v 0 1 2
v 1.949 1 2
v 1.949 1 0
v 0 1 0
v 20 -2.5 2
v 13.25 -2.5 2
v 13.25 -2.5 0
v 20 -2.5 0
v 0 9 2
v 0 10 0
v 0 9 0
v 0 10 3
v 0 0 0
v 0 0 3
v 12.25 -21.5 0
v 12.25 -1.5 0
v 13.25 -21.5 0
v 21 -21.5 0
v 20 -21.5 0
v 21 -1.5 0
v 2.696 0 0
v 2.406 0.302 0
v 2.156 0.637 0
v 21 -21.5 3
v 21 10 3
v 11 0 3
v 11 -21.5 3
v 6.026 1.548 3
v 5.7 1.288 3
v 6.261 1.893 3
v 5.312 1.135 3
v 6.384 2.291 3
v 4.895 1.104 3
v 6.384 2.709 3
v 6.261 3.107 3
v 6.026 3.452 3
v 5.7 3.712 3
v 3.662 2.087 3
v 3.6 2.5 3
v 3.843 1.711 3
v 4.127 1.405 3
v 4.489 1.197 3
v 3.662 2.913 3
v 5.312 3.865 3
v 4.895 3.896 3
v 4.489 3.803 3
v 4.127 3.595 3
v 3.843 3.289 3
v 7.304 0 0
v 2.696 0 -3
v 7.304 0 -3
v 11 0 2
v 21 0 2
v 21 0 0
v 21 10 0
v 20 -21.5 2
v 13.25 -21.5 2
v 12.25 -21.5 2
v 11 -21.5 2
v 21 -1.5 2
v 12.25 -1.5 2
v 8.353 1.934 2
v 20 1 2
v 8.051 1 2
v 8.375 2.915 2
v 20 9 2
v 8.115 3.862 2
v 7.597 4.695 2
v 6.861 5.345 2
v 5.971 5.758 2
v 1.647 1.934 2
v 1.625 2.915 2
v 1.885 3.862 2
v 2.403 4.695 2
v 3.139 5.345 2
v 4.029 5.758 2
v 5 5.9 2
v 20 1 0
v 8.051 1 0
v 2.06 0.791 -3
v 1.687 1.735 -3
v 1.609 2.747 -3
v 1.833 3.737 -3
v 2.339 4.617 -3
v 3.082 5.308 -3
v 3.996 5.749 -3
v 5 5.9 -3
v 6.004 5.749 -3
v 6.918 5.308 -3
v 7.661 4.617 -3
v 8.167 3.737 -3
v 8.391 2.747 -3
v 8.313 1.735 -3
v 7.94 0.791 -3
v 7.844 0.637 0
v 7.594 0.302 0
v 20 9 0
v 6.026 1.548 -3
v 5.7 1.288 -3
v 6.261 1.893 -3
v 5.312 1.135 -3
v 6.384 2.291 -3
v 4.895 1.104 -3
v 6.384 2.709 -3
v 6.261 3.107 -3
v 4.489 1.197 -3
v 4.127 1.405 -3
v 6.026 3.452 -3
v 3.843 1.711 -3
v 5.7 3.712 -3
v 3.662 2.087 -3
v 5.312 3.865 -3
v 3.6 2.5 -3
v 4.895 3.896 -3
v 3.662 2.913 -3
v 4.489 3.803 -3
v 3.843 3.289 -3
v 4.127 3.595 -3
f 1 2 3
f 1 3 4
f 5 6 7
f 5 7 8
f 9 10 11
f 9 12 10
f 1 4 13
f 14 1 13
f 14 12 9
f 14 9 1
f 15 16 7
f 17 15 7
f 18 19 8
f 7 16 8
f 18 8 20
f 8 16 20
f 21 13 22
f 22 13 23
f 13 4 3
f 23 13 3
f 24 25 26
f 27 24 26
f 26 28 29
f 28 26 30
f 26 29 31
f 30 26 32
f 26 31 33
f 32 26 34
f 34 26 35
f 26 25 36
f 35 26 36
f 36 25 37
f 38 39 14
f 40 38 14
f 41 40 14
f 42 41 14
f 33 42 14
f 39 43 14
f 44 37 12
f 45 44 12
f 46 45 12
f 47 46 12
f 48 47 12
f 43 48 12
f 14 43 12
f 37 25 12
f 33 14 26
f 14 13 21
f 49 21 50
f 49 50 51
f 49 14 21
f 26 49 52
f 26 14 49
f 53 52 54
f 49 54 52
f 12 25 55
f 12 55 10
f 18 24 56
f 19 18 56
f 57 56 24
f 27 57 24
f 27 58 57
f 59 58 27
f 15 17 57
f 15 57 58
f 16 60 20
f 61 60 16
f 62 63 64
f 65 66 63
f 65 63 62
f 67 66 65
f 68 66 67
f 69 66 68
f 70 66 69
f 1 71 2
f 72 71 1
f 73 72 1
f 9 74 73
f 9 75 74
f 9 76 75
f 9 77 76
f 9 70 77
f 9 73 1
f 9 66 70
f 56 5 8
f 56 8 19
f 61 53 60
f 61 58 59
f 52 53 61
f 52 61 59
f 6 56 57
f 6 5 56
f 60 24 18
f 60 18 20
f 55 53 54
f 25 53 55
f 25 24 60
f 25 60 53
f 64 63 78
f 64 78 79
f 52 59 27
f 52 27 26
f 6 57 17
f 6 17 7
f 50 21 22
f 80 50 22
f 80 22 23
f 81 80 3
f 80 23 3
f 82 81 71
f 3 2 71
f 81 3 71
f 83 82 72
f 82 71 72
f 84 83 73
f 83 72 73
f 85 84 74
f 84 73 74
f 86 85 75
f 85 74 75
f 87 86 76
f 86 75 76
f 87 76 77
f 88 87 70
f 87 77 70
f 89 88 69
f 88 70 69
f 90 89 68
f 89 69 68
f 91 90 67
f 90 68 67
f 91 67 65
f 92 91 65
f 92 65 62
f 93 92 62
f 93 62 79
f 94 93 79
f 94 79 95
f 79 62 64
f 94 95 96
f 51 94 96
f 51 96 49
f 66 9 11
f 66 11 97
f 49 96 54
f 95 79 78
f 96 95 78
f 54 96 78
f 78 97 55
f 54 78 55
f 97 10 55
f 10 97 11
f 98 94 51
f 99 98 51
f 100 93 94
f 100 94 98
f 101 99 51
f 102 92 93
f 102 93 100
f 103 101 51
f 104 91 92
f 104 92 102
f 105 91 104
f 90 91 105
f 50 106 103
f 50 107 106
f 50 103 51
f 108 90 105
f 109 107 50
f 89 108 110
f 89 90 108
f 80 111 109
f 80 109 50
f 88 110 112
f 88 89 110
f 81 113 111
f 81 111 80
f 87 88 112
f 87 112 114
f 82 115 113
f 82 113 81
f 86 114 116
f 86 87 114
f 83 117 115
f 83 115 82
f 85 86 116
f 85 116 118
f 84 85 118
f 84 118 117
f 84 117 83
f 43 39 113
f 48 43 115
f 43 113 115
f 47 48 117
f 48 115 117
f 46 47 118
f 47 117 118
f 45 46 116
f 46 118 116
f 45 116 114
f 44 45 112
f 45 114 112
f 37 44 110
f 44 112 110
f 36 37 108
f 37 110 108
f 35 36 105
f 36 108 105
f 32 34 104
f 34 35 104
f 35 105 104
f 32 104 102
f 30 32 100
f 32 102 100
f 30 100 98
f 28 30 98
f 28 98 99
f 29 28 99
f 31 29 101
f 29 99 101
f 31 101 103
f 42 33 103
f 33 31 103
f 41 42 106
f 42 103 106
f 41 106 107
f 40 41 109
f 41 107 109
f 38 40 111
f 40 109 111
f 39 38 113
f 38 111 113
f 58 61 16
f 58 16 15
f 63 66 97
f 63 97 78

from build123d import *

# Parameters (mm, degrees)
CYLINDER005_R     = 1.4
CYLINDER005_DEPTH = 10
EXTRUDE001_DEPTH  = 2
SKETCH002_R       = 1.4
EXTRUDE002_DEPTH  = 6
EXTRUDE_DEPTH     = 1


with BuildPart() as cylinder005:
    # Cylinder005 → Cylinder005 (new body)
    with BuildSketch(Plane(origin=(-5, 2.5, -5), x_dir=(1, 0, 0), z_dir=(0, 0, 1))):
        Circle(CYLINDER005_R)
    extrude(amount=CYLINDER005_DEPTH)


with BuildPart() as extrude001:
    # Sketch001 → Extrude001 (new body)
    with BuildSketch(Plane.XY.offset(10)):
        Polygon((-21, 10), (0, 10), (0, 9), (-20, 9), (-20, 1), (0, 1), (0, 0), (-21, 0), align=None)
        Polygon((-21, -1.5), (-12.25, -1.5), (-12.25, -21.5), (-13.25, -21.5), (-13.25, -2.5), (-20, -2.5), (-20, -21.5), (-21, -21.5), align=None)
    extrude(amount=-EXTRUDE001_DEPTH)


with BuildPart() as extrude001_1:
    # Extrude001 placement: moved
    add(extrude001.part.moved(Location((0, 0, -8))))


with BuildPart() as extrude002:
    # Sketch002 → Extrude002 (new body)
    with BuildSketch(Plane.XY.offset(10)):
        with BuildLine():
            ThreePointArc((-2.695656, 0), (-5, 5.9), (-7.304344, 0))
            Line((-7.304344, 0), (-2.695656, 0))
        make_face()
        with Locations((-5, 2.5)):
            Circle(SKETCH002_R, mode=Mode.SUBTRACT)
    extrude(amount=-EXTRUDE002_DEPTH)


with BuildPart() as extrude002_1:
    # Extrude002 placement: moved
    add(extrude002.part.moved(Location((0, 0, -7))))


with BuildPart() as body002:
    # Sketch → Extrude (new body)
    with BuildSketch(Plane.XY):
        Polygon((-11, 0), (0, 0), (0, 10), (-21, 10), (-21, -21.5), (-11, -21.5), align=None)
    extrude(amount=EXTRUDE_DEPTH)


with BuildPart() as body002_1:
    # Extrude placement: moved
    add(body002.part.moved(Location((0, 0, 2))))

    # Fusion012: union Extrude001, Extrude002
    add(extrude001_1.part)
    add(extrude002_1.part)

    # Cut001: cut Cylinder005
    add(cylinder005.part, mode=Mode.SUBTRACT)


with BuildPart() as part_mirroring003:
    # Part__Mirroring003: instance of Body002
    add(body002_1.part.mirror(Plane(origin=(0, 0, 0), x_dir=(0, -1, 0), z_dir=(1, 0, 0))))


solid = part_mirroring003.part
